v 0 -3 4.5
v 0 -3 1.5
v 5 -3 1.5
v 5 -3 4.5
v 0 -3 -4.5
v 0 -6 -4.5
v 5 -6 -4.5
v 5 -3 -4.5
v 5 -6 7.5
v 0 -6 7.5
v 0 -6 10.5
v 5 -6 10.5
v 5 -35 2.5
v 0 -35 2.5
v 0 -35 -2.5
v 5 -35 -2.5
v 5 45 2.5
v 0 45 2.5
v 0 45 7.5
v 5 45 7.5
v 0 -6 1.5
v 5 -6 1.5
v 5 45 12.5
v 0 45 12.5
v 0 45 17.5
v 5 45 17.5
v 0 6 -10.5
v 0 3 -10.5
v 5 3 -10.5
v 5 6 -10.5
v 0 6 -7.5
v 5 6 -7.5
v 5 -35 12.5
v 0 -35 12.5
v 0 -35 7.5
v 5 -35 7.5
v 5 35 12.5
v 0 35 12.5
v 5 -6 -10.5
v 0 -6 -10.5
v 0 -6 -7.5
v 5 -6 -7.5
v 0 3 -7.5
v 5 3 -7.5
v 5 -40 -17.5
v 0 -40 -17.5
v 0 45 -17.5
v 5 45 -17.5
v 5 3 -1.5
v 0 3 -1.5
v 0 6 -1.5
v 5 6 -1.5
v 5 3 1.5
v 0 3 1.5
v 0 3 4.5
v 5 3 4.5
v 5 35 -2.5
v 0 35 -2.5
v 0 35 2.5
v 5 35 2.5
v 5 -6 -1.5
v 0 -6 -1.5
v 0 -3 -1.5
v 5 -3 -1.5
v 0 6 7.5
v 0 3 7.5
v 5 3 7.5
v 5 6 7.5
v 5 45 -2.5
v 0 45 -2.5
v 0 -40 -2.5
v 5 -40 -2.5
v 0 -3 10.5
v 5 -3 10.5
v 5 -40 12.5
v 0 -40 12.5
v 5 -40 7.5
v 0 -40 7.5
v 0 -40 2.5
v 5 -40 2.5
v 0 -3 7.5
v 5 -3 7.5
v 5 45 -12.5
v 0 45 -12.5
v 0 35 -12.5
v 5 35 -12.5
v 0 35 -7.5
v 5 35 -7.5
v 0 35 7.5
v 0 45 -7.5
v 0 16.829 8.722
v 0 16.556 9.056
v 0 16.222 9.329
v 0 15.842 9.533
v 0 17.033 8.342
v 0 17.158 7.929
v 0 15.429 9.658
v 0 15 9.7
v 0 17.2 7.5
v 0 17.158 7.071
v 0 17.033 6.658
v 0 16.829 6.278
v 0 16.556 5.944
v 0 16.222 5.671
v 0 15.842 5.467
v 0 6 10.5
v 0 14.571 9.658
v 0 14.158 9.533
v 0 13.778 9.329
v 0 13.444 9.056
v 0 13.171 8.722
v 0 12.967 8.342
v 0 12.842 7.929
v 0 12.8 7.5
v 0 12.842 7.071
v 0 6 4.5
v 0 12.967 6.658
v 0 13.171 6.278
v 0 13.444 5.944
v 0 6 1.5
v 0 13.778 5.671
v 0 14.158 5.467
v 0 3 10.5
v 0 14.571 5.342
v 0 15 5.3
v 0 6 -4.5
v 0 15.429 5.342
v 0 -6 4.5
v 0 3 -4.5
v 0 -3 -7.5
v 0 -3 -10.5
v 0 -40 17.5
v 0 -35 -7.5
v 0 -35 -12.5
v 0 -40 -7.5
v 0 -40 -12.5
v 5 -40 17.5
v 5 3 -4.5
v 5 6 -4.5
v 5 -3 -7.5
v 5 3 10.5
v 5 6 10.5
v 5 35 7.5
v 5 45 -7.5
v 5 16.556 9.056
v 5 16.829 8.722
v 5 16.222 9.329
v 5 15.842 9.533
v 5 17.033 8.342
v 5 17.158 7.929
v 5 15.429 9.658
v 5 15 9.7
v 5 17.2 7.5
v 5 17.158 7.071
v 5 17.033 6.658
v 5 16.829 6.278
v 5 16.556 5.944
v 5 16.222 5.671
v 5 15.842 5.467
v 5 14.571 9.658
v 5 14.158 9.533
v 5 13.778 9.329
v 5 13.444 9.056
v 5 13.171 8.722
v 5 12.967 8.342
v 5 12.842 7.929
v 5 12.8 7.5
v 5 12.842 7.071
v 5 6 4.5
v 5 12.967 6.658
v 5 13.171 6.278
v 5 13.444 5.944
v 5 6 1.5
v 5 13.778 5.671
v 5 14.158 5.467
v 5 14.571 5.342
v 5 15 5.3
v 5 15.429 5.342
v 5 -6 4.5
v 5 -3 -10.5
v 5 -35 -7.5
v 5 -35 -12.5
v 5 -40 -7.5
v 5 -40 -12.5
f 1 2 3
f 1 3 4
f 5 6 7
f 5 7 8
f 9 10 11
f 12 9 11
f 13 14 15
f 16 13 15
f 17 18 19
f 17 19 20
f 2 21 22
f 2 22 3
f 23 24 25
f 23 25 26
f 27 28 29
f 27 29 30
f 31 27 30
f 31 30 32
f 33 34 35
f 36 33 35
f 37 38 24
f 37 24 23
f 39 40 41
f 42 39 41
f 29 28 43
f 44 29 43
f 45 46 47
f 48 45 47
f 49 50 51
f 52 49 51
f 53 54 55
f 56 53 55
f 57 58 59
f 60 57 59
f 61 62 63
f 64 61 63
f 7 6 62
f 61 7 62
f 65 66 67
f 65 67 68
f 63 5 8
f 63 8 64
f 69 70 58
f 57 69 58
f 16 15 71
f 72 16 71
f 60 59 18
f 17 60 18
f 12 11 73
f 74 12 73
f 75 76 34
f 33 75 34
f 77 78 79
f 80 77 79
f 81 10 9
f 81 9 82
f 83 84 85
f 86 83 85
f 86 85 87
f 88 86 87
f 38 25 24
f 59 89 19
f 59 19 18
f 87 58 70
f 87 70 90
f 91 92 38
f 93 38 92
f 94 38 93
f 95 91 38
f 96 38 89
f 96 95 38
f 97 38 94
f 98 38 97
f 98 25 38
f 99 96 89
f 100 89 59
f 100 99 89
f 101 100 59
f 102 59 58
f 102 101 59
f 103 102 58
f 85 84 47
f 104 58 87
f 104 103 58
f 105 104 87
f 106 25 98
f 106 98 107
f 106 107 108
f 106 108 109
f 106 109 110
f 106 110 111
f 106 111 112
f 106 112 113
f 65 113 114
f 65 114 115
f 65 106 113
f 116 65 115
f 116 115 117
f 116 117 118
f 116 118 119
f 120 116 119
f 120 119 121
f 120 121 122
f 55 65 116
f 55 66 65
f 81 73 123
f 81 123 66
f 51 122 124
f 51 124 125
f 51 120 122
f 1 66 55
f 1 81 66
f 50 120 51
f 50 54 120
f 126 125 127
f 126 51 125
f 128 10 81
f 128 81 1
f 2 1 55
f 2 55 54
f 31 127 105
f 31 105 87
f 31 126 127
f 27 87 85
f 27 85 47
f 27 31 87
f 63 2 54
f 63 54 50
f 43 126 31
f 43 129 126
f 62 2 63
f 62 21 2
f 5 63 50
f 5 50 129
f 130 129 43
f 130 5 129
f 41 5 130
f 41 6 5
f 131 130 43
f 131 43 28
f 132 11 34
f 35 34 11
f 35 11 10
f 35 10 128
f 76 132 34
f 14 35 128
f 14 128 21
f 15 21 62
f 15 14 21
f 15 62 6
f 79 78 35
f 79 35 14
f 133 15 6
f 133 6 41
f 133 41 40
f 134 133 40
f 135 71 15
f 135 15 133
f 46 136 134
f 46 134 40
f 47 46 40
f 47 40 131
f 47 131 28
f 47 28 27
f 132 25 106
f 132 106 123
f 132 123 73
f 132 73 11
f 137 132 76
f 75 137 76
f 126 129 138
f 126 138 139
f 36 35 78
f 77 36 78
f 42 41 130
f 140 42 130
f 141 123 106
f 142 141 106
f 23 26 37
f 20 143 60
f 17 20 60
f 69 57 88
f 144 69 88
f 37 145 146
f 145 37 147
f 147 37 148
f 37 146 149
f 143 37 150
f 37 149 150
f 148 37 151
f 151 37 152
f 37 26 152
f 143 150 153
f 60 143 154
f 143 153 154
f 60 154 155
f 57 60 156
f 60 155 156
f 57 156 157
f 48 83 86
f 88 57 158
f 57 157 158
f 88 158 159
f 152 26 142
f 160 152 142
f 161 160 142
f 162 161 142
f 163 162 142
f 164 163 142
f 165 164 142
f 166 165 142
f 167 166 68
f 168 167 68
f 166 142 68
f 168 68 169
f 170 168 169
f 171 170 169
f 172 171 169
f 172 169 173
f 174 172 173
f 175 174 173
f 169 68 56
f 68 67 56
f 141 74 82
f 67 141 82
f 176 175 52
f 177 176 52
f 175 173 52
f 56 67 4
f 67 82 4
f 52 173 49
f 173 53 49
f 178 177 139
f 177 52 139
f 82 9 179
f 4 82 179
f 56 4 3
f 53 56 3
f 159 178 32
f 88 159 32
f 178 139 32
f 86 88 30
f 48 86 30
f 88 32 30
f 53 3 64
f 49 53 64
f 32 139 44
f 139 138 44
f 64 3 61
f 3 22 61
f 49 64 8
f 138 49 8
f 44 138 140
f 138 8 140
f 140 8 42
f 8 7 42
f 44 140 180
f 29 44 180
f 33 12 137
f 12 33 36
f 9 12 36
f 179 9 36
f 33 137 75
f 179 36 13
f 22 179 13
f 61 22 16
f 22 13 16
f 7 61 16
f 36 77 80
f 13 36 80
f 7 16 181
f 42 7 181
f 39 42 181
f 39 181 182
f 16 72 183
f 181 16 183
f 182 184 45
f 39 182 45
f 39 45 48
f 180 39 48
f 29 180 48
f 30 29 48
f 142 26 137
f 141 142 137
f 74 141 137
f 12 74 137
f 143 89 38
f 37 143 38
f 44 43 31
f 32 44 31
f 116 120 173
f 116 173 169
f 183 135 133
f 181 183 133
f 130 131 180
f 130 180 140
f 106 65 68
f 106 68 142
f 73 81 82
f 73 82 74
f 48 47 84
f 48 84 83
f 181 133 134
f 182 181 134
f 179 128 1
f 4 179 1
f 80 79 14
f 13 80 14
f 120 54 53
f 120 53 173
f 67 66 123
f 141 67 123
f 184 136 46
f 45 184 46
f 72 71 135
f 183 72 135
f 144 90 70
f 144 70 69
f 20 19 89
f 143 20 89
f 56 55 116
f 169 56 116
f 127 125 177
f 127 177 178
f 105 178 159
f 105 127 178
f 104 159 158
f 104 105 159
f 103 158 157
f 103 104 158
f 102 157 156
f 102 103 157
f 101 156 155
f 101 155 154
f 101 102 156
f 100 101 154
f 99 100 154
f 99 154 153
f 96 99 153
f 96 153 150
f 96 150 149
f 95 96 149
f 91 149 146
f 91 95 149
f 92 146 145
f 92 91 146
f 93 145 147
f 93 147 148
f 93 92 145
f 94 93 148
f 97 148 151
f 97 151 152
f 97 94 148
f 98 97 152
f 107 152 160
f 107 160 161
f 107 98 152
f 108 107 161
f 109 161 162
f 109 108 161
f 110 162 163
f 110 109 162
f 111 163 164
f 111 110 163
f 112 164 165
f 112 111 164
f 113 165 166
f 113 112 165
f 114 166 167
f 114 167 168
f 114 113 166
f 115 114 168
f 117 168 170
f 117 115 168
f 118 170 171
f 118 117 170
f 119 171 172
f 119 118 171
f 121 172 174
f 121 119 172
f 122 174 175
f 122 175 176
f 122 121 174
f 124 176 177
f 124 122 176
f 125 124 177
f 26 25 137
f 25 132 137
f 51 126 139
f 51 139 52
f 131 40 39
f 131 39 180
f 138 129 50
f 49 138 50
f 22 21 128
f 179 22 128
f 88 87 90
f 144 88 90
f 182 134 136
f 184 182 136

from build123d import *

# Parameters (mm, degrees)
ESQUISSE1_R             = 2.2
BOSS_EXTRU_1_DEPTH      = 5
ESQUISSE3_W             = 5
ESQUISSE3_H             = 5
BOSS_EXTRU_3_DEPTH      = 5
ESQUISSE4_W             = 3
ESQUISSE4_H             = 3
ENL_V_MAT_EXTRU_1_DEPTH = 10


with BuildPart() as part:
    # Esquisse1 → Boss.-Extru.1 (new body)
    with BuildSketch(Plane(origin=(0, 0, 0), x_dir=(0, 0, -1), z_dir=(1, 0, 0))):
        Polygon((-17.5, -40), (-12.5, -40), (-12.5, -35), (-7.5, -35), (-7.5, -40), (-2.5, -40), (-2.5, -35), (2.5, -35), (2.5, -40), (7.5, -40), (7.5, -35), (12.5, -35), (12.5, -40), (17.5, -40), (17.5, 40), (12.5, 40), (12.5, 35), (7.5, 35), (7.5, 40), (2.5, 40), (2.5, 35), (-2.5, 35), (-2.5, 40), (-7.5, 40), (-7.5, 35), (-12.5, 35), (-12.5, 40), (-17.5, 40), align=None)
        with Locations((-7.5, 15)):
            Circle(ESQUISSE1_R, mode=Mode.SUBTRACT)
    extrude(amount=BOSS_EXTRU_1_DEPTH)

    # Esquisse3 → Boss.-Extru.3 (add)
    with BuildSketch(Plane(origin=(0, 40, 0), x_dir=(1, 0, 0), z_dir=(0, 1, 0))):
        with Locations((2.5, -15)):
            Rectangle(ESQUISSE3_W, ESQUISSE3_H)
        with Locations((2.5, -5)):
            Rectangle(ESQUISSE3_W, ESQUISSE3_H)
        with Locations((2.5, 5)):
            Rectangle(ESQUISSE3_W, ESQUISSE3_H)
        with Locations((2.5, 15)):
            Rectangle(ESQUISSE3_W, ESQUISSE3_H)
    extrude(amount=BOSS_EXTRU_3_DEPTH)

    # Esquisse4 → Enlèv. mat.-Extru.1 (cut)
    with BuildSketch(Plane.ZY):
        with Locations((-3, -4.5)):
            Rectangle(ESQUISSE4_W, ESQUISSE4_H)
        with Locations((-9, -4.5)):
            Rectangle(ESQUISSE4_W, ESQUISSE4_H)
        with Locations((3, -4.5)):
            Rectangle(ESQUISSE4_W, ESQUISSE4_H)
        with Locations((9, -4.5)):
            Rectangle(ESQUISSE4_W, ESQUISSE4_H)
        with Locations((9, 4.5)):
            Rectangle(ESQUISSE4_W, ESQUISSE4_H)
        with Locations((3, 4.5)):
            Rectangle(ESQUISSE4_W, ESQUISSE4_H)
        with Locations((-3, 4.5)):
            Rectangle(ESQUISSE4_W, ESQUISSE4_H)
        with Locations((-9, 4.5)):
            Rectangle(ESQUISSE4_W, ESQUISSE4_H)
    extrude(amount=-ENL_V_MAT_EXTRU_1_DEPTH, mode=Mode.SUBTRACT)


solid = part.part
